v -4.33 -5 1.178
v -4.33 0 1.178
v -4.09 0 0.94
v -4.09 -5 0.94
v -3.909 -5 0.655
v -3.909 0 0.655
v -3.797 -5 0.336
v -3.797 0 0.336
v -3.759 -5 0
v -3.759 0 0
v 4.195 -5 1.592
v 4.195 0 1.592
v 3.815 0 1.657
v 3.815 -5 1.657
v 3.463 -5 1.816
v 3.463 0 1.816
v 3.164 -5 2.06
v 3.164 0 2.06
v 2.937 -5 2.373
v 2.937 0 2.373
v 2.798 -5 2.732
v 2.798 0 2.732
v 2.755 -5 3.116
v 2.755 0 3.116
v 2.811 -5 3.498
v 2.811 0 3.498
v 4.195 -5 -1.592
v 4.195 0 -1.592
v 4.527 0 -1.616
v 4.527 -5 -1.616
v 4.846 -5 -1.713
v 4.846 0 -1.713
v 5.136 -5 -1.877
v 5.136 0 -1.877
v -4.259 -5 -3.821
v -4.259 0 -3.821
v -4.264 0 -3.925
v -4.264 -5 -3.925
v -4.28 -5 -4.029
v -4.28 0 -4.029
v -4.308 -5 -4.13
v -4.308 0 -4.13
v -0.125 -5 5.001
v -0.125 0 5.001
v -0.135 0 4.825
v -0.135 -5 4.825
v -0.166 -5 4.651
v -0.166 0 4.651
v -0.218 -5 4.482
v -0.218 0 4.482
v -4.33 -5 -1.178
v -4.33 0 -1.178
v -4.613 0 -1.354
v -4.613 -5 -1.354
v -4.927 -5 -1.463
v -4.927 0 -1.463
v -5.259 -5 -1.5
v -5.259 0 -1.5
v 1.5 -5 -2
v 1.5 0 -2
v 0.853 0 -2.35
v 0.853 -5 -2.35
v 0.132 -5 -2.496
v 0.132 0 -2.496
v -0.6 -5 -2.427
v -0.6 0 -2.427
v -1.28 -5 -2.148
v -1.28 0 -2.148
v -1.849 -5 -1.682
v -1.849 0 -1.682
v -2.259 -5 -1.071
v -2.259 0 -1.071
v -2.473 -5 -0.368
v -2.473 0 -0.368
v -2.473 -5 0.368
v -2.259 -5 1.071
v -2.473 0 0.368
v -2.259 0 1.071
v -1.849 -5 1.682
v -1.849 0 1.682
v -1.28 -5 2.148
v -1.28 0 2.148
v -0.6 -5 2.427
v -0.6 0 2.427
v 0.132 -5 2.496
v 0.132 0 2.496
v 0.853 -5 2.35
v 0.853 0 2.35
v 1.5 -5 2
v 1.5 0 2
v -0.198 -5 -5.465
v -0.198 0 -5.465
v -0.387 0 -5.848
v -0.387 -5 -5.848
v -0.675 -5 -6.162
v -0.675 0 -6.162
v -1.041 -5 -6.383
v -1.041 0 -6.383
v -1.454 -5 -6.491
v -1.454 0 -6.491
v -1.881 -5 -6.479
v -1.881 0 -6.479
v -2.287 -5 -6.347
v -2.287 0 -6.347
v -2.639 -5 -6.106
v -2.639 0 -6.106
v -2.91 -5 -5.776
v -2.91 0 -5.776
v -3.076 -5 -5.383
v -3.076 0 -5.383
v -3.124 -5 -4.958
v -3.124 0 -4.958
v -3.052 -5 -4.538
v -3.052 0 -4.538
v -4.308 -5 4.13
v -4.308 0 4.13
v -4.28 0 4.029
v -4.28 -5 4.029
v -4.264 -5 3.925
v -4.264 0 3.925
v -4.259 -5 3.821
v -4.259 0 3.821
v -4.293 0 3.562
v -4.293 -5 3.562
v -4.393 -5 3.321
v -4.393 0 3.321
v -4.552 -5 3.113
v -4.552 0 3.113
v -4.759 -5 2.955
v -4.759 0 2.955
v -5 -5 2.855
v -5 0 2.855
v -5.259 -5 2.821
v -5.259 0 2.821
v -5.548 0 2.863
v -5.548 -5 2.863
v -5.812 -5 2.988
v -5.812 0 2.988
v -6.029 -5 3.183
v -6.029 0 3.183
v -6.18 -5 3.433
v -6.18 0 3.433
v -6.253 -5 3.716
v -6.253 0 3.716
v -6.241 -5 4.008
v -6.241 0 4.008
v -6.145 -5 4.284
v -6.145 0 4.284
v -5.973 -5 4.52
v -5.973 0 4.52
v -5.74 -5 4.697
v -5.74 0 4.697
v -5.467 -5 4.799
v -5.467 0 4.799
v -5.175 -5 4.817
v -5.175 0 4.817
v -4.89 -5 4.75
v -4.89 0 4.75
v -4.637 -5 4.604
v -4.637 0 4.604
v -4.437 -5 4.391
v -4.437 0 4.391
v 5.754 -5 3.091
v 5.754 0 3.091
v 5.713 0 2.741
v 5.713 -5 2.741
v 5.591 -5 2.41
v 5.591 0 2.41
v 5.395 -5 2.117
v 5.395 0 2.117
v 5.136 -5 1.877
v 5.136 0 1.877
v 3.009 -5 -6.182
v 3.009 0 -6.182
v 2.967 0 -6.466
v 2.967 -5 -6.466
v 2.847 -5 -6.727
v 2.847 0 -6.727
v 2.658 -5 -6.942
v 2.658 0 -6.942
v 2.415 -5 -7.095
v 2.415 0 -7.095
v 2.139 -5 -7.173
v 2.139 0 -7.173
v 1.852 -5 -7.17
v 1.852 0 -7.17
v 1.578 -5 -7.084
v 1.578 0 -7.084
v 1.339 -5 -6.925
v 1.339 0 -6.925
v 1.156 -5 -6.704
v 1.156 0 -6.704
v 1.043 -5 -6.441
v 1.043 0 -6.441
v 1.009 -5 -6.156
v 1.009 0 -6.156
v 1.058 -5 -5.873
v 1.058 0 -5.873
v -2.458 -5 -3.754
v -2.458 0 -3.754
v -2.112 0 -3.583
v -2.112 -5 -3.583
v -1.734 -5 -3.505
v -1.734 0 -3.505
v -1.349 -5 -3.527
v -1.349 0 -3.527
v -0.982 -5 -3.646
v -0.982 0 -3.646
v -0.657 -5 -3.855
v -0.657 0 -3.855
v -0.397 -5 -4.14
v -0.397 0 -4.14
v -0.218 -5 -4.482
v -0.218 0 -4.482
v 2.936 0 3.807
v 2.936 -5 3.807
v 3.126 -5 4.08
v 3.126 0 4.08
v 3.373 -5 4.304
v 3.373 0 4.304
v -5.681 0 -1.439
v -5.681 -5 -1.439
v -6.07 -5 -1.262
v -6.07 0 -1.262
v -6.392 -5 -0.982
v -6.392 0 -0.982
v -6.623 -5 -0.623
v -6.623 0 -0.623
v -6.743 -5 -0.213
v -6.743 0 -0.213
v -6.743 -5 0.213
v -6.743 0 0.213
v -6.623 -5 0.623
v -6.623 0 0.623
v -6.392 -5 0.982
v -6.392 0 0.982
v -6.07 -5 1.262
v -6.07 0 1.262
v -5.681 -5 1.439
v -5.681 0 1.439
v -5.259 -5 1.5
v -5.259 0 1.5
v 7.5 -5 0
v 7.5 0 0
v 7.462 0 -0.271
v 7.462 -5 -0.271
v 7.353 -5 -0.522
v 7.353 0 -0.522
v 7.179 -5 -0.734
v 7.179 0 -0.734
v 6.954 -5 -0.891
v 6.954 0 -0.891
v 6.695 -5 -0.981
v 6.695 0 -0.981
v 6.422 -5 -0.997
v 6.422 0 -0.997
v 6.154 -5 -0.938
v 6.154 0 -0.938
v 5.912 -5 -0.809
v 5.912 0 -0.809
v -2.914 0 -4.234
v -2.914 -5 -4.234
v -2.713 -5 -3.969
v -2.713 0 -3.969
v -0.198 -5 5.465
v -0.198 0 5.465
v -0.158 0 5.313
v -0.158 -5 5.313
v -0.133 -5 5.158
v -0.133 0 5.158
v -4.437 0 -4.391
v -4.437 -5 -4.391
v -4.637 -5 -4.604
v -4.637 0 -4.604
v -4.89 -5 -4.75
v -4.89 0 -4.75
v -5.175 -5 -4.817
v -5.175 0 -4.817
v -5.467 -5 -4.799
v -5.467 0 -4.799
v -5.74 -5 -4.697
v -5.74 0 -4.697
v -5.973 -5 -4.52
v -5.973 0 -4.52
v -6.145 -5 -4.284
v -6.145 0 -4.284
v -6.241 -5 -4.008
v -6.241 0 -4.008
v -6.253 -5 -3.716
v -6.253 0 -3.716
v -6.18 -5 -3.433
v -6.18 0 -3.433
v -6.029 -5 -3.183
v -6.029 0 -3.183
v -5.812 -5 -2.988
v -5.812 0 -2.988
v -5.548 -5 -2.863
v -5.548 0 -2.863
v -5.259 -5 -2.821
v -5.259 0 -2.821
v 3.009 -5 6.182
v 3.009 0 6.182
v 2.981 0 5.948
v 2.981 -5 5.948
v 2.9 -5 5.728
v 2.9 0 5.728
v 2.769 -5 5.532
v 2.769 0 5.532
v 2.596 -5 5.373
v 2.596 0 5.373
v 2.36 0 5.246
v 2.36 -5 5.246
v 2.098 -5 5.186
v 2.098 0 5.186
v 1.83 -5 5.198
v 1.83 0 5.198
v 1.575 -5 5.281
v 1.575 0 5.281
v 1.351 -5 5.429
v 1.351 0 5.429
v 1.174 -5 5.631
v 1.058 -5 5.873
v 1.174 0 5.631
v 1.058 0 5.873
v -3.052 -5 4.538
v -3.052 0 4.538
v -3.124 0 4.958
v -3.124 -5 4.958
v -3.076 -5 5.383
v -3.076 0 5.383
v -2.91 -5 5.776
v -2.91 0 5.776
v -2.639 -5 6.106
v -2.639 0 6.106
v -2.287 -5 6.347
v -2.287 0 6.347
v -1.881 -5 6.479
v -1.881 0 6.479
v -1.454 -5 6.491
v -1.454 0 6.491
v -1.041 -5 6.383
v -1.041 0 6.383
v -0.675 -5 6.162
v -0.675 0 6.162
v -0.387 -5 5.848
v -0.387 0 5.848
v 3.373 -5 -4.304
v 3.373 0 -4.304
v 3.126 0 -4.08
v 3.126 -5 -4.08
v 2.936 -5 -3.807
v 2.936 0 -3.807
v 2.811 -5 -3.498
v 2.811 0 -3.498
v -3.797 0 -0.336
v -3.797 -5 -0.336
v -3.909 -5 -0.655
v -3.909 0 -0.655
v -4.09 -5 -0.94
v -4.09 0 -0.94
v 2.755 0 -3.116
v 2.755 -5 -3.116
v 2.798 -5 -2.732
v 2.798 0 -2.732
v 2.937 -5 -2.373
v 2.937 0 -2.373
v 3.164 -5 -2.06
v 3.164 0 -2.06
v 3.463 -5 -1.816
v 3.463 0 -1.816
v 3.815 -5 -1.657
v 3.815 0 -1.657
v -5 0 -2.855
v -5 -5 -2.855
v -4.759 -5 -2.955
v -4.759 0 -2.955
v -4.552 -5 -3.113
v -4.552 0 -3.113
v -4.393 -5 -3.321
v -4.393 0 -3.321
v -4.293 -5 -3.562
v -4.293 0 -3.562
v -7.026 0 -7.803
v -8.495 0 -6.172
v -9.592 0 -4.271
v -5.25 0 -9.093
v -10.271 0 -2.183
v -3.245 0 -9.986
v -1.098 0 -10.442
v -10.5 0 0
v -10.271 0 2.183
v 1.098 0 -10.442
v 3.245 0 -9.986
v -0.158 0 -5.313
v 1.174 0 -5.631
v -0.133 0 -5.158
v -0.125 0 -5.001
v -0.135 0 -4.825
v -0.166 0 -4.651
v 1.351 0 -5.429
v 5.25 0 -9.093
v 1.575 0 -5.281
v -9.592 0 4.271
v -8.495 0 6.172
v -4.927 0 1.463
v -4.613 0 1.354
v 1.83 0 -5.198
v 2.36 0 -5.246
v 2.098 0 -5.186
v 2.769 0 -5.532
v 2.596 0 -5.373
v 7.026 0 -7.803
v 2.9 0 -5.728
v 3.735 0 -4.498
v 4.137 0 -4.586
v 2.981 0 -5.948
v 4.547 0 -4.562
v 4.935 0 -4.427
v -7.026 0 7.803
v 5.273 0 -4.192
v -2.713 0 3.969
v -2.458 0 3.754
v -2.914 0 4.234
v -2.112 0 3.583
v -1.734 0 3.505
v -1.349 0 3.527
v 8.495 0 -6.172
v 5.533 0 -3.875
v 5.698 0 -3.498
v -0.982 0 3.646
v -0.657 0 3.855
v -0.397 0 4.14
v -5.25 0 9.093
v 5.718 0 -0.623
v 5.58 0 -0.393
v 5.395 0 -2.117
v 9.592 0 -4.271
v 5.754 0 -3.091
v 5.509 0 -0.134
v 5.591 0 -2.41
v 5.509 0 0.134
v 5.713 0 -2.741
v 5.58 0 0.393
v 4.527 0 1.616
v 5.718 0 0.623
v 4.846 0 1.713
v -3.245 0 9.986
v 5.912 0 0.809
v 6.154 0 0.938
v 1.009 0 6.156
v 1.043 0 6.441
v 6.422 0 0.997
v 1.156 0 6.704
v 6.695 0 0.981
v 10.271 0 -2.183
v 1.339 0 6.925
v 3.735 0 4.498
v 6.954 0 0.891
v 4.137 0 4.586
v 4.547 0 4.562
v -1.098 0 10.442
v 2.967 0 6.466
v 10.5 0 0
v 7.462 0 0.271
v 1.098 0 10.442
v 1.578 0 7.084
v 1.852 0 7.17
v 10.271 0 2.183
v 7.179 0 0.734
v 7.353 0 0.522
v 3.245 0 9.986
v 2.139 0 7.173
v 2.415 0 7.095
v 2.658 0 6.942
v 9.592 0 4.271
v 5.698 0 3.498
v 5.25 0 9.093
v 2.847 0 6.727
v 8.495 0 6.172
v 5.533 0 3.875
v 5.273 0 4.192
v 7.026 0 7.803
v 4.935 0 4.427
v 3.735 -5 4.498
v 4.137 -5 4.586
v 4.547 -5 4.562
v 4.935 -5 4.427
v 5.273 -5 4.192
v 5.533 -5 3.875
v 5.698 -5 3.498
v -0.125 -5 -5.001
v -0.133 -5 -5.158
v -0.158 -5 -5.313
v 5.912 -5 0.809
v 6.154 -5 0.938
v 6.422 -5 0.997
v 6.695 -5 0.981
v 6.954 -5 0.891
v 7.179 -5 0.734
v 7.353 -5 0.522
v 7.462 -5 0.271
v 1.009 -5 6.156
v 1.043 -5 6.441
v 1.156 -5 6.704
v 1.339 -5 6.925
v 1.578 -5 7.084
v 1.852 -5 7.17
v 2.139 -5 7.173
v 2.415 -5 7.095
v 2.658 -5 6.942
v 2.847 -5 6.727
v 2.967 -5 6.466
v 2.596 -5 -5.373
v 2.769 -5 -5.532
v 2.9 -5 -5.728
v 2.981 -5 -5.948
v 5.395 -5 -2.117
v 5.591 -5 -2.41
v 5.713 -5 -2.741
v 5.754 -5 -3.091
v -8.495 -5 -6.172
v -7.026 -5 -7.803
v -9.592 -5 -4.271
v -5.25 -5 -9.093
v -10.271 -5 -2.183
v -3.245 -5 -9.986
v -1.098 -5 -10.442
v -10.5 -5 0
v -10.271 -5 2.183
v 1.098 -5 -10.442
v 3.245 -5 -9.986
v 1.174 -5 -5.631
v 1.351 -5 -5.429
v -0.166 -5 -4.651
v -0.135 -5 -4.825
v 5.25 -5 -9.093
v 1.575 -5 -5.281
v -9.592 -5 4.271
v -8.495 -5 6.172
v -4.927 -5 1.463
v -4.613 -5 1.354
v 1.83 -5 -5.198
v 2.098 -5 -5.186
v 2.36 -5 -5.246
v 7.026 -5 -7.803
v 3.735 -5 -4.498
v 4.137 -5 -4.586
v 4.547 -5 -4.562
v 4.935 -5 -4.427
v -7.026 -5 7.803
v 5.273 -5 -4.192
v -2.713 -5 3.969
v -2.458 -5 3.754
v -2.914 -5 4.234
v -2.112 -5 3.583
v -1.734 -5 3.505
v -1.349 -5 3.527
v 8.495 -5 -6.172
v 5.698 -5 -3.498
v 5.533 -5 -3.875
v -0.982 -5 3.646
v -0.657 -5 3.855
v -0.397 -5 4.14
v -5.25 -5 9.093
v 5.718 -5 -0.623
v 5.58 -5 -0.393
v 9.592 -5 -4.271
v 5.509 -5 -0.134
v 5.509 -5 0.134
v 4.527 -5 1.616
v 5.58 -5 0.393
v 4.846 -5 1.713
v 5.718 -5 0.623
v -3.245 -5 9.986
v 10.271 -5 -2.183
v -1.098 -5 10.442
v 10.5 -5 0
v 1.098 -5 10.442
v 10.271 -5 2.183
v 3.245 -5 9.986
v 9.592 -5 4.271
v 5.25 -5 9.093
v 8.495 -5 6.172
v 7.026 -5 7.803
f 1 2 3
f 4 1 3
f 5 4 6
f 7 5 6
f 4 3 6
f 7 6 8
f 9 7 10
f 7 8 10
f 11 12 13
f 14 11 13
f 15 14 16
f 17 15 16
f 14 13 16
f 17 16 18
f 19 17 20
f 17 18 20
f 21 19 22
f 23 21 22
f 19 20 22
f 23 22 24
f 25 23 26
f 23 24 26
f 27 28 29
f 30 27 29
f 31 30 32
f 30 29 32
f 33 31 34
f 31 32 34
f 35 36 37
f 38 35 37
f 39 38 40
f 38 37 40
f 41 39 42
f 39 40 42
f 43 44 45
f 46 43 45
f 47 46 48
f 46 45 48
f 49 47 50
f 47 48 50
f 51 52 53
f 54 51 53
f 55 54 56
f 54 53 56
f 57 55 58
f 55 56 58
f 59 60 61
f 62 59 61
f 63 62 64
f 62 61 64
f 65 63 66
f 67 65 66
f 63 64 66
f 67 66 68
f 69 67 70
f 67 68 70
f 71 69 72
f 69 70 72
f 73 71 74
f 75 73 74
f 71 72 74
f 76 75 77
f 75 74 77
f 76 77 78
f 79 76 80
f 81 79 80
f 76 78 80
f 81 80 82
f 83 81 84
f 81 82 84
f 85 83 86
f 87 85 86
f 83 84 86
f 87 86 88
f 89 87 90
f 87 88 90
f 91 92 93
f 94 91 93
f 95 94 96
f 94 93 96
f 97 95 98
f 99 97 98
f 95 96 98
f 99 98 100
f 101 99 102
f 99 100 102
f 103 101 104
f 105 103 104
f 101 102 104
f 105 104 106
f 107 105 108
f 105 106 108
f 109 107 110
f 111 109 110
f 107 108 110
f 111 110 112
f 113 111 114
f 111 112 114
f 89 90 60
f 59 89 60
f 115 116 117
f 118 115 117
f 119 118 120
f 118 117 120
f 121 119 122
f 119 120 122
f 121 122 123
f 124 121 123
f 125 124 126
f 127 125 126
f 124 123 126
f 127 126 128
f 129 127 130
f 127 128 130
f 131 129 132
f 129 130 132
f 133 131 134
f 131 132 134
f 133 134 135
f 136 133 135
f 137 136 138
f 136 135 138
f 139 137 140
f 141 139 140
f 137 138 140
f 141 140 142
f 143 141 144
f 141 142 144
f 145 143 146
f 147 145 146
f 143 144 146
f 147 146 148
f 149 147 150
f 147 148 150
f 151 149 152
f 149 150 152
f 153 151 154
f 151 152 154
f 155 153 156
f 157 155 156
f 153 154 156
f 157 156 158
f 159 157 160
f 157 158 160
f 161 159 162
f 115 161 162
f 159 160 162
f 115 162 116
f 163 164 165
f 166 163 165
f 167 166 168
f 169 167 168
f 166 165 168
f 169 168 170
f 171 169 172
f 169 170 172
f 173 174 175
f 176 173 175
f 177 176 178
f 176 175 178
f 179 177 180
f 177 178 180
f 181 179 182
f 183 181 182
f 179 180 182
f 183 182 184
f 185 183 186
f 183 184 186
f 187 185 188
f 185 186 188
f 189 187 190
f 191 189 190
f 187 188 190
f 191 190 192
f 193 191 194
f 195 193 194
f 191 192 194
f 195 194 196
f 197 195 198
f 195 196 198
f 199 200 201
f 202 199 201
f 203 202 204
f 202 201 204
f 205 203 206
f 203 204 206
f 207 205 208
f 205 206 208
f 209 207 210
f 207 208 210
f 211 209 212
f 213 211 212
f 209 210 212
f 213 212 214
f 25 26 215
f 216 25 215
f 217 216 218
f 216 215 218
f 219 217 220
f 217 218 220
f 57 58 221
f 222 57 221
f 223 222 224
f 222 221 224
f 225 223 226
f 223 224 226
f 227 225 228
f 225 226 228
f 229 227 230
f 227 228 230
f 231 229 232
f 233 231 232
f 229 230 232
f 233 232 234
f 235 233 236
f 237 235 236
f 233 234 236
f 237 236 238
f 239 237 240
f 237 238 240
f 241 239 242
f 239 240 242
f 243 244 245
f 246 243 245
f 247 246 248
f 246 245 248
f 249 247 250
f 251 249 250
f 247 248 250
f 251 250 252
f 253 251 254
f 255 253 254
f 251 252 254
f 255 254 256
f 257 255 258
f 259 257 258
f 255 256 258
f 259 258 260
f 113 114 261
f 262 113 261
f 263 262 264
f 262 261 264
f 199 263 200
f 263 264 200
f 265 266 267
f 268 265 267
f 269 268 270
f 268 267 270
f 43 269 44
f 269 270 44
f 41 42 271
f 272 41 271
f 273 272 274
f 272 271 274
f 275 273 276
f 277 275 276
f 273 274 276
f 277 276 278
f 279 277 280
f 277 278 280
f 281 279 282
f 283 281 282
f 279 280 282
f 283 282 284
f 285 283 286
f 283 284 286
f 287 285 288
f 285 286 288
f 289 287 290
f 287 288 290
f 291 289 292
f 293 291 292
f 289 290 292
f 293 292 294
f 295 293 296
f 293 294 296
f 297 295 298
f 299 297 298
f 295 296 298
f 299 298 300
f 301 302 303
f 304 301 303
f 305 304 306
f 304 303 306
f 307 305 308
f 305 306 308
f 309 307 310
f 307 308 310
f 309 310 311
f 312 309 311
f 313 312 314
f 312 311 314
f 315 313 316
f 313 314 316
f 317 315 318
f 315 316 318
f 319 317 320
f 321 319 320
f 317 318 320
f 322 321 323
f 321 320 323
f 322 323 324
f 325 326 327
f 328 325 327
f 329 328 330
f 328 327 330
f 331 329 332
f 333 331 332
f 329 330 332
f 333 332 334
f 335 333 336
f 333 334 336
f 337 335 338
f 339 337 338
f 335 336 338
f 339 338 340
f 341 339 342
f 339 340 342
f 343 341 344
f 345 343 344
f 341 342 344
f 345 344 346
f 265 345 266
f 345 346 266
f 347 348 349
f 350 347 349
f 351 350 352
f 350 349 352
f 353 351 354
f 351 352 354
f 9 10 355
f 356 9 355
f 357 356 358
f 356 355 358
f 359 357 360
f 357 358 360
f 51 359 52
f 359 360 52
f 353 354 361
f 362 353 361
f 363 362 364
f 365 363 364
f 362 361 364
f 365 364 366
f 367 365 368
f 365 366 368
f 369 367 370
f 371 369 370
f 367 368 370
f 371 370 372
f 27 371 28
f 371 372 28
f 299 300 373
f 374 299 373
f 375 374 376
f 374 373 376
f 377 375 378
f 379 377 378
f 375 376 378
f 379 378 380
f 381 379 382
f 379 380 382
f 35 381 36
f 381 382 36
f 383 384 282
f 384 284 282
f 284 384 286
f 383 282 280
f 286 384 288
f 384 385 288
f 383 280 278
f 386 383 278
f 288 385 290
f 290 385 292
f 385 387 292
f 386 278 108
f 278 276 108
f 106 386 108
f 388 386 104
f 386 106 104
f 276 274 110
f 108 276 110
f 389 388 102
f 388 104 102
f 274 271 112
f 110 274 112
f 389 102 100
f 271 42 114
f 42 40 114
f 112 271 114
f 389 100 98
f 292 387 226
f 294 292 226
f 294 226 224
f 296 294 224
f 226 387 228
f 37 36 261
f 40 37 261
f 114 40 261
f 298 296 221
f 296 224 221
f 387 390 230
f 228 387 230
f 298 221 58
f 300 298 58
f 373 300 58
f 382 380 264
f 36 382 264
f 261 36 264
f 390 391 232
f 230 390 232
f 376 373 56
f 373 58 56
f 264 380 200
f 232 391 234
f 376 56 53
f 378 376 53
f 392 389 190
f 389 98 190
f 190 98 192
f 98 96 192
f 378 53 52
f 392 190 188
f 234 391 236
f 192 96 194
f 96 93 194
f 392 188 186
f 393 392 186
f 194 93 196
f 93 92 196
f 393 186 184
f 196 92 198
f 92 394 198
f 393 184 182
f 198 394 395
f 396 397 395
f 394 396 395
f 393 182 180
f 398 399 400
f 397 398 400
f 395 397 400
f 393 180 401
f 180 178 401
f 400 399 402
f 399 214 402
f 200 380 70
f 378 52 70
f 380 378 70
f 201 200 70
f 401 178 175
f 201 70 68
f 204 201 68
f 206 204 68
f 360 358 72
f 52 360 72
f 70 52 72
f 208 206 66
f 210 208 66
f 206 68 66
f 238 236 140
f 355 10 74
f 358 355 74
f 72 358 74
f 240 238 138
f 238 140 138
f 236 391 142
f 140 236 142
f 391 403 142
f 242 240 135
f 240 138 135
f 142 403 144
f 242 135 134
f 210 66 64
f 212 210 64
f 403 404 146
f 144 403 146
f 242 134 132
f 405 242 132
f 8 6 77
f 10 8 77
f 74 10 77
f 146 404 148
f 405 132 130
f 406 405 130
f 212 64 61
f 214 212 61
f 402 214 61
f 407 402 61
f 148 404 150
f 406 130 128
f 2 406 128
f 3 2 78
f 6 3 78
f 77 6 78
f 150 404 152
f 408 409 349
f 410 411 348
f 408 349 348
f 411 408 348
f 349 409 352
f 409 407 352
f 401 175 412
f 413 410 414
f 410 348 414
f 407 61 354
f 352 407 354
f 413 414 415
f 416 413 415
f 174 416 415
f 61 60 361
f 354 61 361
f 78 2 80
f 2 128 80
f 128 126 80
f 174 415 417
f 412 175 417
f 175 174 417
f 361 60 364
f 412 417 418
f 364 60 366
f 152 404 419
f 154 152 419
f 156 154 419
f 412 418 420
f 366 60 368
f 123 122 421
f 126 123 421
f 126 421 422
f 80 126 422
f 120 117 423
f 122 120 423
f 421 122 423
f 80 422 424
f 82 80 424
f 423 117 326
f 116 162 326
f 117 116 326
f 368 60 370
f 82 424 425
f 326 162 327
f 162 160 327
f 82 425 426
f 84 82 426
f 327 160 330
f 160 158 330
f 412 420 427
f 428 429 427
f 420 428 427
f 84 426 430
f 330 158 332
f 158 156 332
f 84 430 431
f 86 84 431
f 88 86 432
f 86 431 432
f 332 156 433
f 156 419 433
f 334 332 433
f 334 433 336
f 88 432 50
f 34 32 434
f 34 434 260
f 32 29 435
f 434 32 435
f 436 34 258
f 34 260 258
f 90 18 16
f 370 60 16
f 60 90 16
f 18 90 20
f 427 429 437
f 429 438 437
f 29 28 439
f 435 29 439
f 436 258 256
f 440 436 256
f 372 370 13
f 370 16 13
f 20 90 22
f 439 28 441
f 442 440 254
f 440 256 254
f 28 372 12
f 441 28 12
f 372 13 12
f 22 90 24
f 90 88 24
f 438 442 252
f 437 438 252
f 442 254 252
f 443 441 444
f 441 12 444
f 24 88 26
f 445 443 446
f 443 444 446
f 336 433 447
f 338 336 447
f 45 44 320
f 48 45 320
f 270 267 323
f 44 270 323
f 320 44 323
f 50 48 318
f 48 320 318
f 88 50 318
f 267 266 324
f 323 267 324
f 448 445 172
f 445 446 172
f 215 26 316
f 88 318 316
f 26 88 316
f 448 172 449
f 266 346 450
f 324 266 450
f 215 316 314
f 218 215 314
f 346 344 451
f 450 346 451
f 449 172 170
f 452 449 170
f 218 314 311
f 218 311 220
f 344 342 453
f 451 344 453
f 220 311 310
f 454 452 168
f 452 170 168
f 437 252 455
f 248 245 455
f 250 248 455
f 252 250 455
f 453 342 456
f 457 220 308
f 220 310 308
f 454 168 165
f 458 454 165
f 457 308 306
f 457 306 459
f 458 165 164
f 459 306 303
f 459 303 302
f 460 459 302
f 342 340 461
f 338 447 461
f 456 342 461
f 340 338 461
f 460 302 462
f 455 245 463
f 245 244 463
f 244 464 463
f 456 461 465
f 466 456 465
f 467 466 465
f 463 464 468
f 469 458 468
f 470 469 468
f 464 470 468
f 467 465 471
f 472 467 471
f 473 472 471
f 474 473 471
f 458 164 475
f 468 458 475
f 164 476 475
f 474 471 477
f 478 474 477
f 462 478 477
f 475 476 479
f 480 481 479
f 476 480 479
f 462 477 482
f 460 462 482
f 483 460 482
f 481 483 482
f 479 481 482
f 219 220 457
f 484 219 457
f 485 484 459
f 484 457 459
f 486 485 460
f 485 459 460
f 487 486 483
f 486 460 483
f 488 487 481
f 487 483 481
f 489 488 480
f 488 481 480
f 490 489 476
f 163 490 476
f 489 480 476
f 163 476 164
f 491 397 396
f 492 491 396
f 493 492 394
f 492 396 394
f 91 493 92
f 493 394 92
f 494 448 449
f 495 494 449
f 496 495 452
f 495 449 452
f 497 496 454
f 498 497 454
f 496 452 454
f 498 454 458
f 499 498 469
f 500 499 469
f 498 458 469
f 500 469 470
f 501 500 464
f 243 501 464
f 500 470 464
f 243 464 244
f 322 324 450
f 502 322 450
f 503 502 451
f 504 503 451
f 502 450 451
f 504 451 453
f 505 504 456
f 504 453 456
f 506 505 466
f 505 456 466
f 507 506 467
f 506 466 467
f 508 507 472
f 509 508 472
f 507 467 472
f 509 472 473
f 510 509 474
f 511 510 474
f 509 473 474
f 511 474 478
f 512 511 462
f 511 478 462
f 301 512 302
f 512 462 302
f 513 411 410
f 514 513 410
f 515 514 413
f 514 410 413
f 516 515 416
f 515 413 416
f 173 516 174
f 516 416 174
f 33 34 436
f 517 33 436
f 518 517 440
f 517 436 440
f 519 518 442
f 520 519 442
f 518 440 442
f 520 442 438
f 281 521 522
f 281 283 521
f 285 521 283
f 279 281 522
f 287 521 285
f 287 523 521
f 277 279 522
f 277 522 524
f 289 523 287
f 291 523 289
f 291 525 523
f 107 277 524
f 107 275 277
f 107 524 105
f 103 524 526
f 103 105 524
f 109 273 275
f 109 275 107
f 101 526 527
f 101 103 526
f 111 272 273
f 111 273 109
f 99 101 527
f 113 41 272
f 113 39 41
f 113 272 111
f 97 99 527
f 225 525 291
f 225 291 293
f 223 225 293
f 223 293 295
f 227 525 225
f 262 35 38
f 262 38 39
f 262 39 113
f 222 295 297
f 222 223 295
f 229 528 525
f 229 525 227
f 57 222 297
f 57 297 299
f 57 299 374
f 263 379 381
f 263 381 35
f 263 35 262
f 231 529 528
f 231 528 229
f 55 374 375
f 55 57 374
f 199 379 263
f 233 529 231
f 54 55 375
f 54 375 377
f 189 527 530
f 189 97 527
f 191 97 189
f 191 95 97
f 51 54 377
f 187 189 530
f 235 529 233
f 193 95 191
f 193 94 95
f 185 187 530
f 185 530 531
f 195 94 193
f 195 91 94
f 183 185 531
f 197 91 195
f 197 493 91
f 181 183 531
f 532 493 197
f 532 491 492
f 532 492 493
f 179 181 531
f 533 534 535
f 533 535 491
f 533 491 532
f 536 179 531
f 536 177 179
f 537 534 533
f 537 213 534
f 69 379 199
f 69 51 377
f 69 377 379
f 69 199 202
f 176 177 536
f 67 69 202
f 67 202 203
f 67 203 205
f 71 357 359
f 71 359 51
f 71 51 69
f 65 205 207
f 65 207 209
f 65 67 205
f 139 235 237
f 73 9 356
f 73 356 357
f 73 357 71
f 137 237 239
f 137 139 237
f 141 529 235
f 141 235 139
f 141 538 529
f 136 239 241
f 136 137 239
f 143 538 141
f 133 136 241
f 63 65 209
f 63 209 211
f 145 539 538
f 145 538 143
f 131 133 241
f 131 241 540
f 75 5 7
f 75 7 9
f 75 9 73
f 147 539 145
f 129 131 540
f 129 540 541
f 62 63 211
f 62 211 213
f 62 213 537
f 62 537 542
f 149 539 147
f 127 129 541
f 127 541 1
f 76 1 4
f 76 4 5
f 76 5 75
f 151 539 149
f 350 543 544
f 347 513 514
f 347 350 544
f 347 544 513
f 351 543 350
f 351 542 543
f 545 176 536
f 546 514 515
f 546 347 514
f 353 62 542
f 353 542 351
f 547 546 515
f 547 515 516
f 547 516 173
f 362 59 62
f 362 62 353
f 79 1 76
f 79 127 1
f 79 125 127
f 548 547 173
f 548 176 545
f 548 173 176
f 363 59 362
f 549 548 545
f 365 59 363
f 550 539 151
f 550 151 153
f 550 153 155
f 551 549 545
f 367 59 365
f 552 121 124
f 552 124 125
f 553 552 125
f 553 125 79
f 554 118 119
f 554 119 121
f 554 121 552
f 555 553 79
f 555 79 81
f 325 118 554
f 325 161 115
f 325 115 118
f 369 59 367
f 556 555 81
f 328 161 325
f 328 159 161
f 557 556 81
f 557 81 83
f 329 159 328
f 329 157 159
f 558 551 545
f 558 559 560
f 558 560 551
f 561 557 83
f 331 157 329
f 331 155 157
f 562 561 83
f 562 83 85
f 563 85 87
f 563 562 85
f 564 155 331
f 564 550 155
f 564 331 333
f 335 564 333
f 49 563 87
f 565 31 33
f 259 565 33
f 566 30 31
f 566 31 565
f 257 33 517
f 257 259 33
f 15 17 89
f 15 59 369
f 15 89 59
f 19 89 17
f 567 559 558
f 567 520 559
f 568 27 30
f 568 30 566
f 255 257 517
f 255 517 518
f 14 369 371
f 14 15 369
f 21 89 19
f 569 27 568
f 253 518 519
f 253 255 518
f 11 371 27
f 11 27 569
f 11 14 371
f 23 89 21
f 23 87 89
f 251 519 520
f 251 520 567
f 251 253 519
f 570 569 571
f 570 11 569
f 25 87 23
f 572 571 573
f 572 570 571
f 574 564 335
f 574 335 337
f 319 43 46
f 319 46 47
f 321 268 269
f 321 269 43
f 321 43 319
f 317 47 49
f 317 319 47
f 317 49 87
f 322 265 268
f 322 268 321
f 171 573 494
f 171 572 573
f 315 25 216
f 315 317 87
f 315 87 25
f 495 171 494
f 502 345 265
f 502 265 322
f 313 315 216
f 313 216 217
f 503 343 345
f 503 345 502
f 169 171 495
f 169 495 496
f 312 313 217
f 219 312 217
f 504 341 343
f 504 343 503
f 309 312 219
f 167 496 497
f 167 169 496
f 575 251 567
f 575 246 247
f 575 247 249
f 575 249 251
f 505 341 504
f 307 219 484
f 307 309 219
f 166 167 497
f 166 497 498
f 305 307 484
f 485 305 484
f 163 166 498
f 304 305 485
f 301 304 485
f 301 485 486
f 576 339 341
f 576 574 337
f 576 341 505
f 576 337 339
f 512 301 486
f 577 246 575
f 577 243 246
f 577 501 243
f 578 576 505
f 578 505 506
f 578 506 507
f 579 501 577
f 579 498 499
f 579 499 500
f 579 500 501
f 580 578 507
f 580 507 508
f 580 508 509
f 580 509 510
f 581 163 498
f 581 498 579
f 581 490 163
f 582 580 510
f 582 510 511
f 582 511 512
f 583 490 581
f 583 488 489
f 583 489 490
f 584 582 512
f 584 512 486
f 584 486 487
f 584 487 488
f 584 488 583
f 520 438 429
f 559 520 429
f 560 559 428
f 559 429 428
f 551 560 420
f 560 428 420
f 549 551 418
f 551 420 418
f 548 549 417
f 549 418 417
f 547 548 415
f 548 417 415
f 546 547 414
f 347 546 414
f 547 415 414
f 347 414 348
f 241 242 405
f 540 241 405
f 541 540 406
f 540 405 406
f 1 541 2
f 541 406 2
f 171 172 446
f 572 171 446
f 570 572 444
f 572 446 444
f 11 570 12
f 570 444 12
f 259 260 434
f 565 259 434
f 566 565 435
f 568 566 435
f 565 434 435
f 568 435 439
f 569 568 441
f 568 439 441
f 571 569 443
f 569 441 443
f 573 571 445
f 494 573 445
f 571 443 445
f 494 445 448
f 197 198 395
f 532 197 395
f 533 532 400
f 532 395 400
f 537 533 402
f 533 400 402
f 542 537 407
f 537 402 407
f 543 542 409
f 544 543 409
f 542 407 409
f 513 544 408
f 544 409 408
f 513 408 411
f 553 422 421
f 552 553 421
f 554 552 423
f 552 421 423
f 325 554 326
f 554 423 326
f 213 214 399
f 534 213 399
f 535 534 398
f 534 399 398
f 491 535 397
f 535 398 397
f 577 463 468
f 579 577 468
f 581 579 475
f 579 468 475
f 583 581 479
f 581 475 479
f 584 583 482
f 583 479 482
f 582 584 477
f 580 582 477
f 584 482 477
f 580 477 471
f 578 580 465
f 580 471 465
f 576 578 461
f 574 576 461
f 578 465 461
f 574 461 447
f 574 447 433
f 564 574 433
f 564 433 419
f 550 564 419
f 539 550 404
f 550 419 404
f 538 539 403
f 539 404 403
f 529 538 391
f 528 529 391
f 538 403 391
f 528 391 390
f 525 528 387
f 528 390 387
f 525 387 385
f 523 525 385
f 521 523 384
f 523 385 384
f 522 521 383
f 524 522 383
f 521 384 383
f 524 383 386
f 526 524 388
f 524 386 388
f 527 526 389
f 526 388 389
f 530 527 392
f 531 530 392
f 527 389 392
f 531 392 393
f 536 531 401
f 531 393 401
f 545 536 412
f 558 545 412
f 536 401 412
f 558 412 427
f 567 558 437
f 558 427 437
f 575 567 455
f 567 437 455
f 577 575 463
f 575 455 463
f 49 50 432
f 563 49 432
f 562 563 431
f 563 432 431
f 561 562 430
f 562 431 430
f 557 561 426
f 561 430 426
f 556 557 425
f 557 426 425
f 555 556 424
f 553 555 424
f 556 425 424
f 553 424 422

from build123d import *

# Parameters (mm, degrees)
F0_R     = 10.5
F1_DEPTH = 5


# Not quite as in the source:
# - a feature names something its author has since deleted; it is built from what else it names


with BuildPart() as f1:
    # F0 (on Front) → F1 (new body)
    with BuildSketch(Plane.XZ):
        Circle(F0_R)
        with BuildLine():
            Line((-6.1874431518, -2.6427799437), (-5.2586104634, -1.91030207))
            Line((-5.2586104634, -1.91030207), (-5.2586104634, -1.5))
            ThreePointArc((-5.2586104634, -1.5), (-6.7586104634, 0), (-5.2586104634, 1.5))
            Line((-5.2586104634, 1.5), (-5.2586104634, 1.91030207))
            Line((-5.2586104634, 1.91030207), (-6.1874431518, 2.6427799437))
            ThreePointArc((-6.1874431518, 2.6427799437), (-6.472135955, 4.7022820183), (-4.4254581722, 5.0679442137))
            Line((-4.4254581722, 5.0679442137), (-3.4418052317, 4.4109199439))
            Line((-3.4418052317, 4.4109199439), (-3.0515847744, 4.5377102563))
            ThreePointArc((-3.0515847744, 4.5377102563), (-2.0885254916, 6.4278205224), (-0.1984152256, 5.4647612395))
            Line((-0.1984152256, 5.4647612395), (0.1918052317, 5.5915515519))
            Line((0.1918052317, 5.5915515519), (0.601408001, 6.7012720437))
            ThreePointArc((0.601408001, 6.7012720437), (2.2724250824, 7.6584857382), (3.5086104634, 6.1818673559))
            ThreePointArc((3.5086104634, 6.1818673559), (3.4944811986, 5.976469794), (3.4523595855, 5.7749417209))
            Line((3.4523595855, 5.7749417209), (3.1314578476, 4.6364005169))
            Line((3.1314578476, 4.6364005169), (3.3726273533, 4.3044591695))
            ThreePointArc((3.3726273533, 4.3044591695), (4.9352909813, 4.4274434642), (5.7543052317, 3.090933678))
            ThreePointArc((5.7543052317, 3.090933678), (5.590815018, 2.4099479283), (5.1359831102, 1.8774081864))
            Line((5.1359831102, 1.8774081864), (5.3771526159, 1.545466839))
            Line((5.3771526159, 1.545466839), (6.5591337375, 1.4988339471))
            ThreePointArc((6.5591337375, 1.4988339471), (7.5813650184, 1.0395430231), (8, 0))
            ThreePointArc((8, 0), (7.5813650184, -1.0395430231), (6.5591337375, -1.4988339471))
            Line((6.5591337375, -1.4988339471), (5.3771526159, -1.545466839))
            Line((5.3771526159, -1.545466839), (5.1359831102, -1.8774081864))
            ThreePointArc((5.1359831102, -1.8774081864), (5.590815018, -2.4099479283), (5.7543052317, -3.090933678))
            ThreePointArc((5.7543052317, -3.090933678), (4.9352909813, -4.4274434642), (3.3726273533, -4.3044591695))
            Line((3.3726273533, -4.3044591695), (3.1314578476, -4.6364005169))
            Line((3.1314578476, -4.6364005169), (3.4523595855, -5.7749417209))
            ThreePointArc((3.4523595855, -5.7749417209), (3.4944811986, -5.976469794), (3.5086104634, -6.1818673559))
            ThreePointArc((3.5086104634, -6.1818673559), (2.2724250824, -7.6584857382), (0.601408001, -6.7012720437))
            Line((0.601408001, -6.7012720437), (0.1918052317, -5.5915515519))
            Line((0.1918052317, -5.5915515519), (-0.1984152256, -5.4647612395))
            ThreePointArc((-0.1984152256, -5.4647612395), (-2.0885254916, -6.4278205224), (-3.0515847744, -4.5377102563))
            Line((-3.0515847744, -4.5377102563), (-3.4418052317, -4.4109199439))
            Line((-3.4418052317, -4.4109199439), (-4.4254581722, -5.0679442137))
            ThreePointArc((-4.4254581722, -5.0679442137), (-6.472135955, -4.7022820183), (-6.1874431518, -2.6427799437))
        make_face(mode=Mode.SUBTRACT)
        with BuildLine():
            Line((-5.2586104634, -1.91030207), (-5.2586104634, -2.3206041399))
            ThreePointArc((-5.2586104634, -2.3206041399), (-4.1979502917, -2.7599439681), (-3.7586104634, -3.8206041399))
            ThreePointArc((-3.7586104634, -3.8206041399), (-3.7770779525, -4.0552558375), (-3.832025689, -4.2841296315))
            Line((-3.832025689, -4.2841296315), (-3.4418052317, -4.4109199439))
            Line((-3.4418052317, -4.4109199439), (-2.4581522912, -3.7538956741))
            ThreePointArc((-2.4581522912, -3.7538956741), (-1.1614745084, -3.5746509735), (-0.2177975376, -4.4818310601))
            Line((-0.2177975376, -4.4818310601), (0.1918052317, -5.5915515519))
            Line((0.1918052317, -5.5915515519), (0.582025689, -5.7183418644))
            ThreePointArc((0.582025689, -5.7183418644), (1.5450849719, -4.7552825815), (2.8902883419, -4.9683418644))
            Line((2.8902883419, -4.9683418644), (3.1314578476, -4.6364005169))
            Line((3.1314578476, -4.6364005169), (2.8105561096, -3.497859313))
            ThreePointArc((2.8105561096, -3.497859313), (3.0407797402, -2.2092557995), (4.1951714942, -1.5920997308))
            Line((4.1951714942, -1.5920997308), (5.3771526159, -1.545466839))
            Line((5.3771526159, -1.545466839), (5.6183221216, -1.2135254916))
            ThreePointArc((5.6183221216, -1.2135254916), (5, 0), (5.6183221216, 1.2135254916))
            Line((5.6183221216, 1.2135254916), (5.3771526159, 1.545466839))
            Line((5.3771526159, 1.545466839), (4.1951714942, 1.5920997308))
            ThreePointArc((4.1951714942, 1.5920997308), (3.0407797402, 2.2092557995), (2.8105561096, 3.497859313))
            Line((2.8105561096, 3.497859313), (3.1314578476, 4.6364005169))
            Line((3.1314578476, 4.6364005169), (2.8902883419, 4.9683418644))
            ThreePointArc((2.8902883419, 4.9683418644), (1.5450849719, 4.7552825815), (0.582025689, 5.7183418644))
            Line((0.582025689, 5.7183418644), (0.1918052317, 5.5915515519))
            Line((0.1918052317, 5.5915515519), (-0.2177975376, 4.4818310601))
            ThreePointArc((-0.2177975376, 4.4818310601), (-1.1614745084, 3.5746509735), (-2.4581522912, 3.7538956741))
            Line((-2.4581522912, 3.7538956741), (-3.4418052317, 4.4109199439))
            Line((-3.4418052317, 4.4109199439), (-3.832025689, 4.2841296315))
            ThreePointArc((-3.832025689, 4.2841296315), (-3.7770779525, 4.0552558375), (-3.7586104634, 3.8206041399))
            ThreePointArc((-3.7586104634, 3.8206041399), (-4.1979502917, 2.7599439681), (-5.2586104634, 2.3206041399))
            Line((-5.2586104634, 2.3206041399), (-5.2586104634, 1.91030207))
            Line((-5.2586104634, 1.91030207), (-4.3297777751, 1.1778241962))
            ThreePointArc((-4.3297777751, 1.1778241962), (-3.9089347556, 0.6545039983), (-3.7586104634, 0))
            ThreePointArc((-3.7586104634, 0), (-3.9089347556, -0.6545039983), (-4.3297777751, -1.1778241962))
            Line((-4.3297777751, -1.1778241962), (-5.2586104634, -1.91030207))
        make_face()
        with BuildLine():
            ThreePointArc((1.5, 2), (2.2360679775, 1.1180339887), (2.5, 0))
            ThreePointArc((2.5, 0), (2.2360679775, -1.1180339887), (1.5, -2))
            ThreePointArc((1.5, -2), (-2.5, 0), (1.5, 2))
        make_face(mode=Mode.SUBTRACT)
        with BuildLine():
            ThreePointArc((1.5, -2), (2.2360679775, -1.1180339887), (2.5, 0))
            ThreePointArc((2.5, 0), (2.2360679775, 1.1180339887), (1.5, 2))
            Line((1.5, 2), (1.5, -2))
        make_face()
        with BuildLine():
            ThreePointArc((-4.3075539471, -4.1296211343), (-6.0676274578, -4.4083893922), (-5.2586104634, -2.8206041399))
            Line((-5.2586104634, -2.8206041399), (-5.2586104634, -2.3206041399))
            ThreePointArc((-5.2586104634, -2.3206041399), (-5.7501710933, -2.403435079), (-6.1874431518, -2.6427799437))
            ThreePointArc((-6.1874431518, -2.6427799437), (-6.472135955, -4.7022820183), (-4.4254581722, -5.0679442137))
            ThreePointArc((-4.4254581722, -5.0679442137), (-4.0627031818, -4.7260354038), (-3.832025689, -4.2841296315))
            Line((-3.832025689, -4.2841296315), (-4.3075539471, -4.1296211343))
        make_face()
        with BuildLine():
            ThreePointArc((-6.1874431518, 2.6427799437), (-5.7501710933, 2.403435079), (-5.2586104634, 2.3206041399))
            Line((-5.2586104634, 2.3206041399), (-5.2586104634, 2.8206041399))
            ThreePointArc((-5.2586104634, 2.8206041399), (-6.0676274578, 4.4083893922), (-4.3075539471, 4.1296211343))
            Line((-4.3075539471, 4.1296211343), (-3.832025689, 4.2841296315))
            ThreePointArc((-3.832025689, 4.2841296315), (-4.0627031818, 4.7260354038), (-4.4254581722, 5.0679442137))
            ThreePointArc((-4.4254581722, 5.0679442137), (-6.472135955, 4.7022820183), (-6.1874431518, 2.6427799437))
        make_face()
        with BuildLine():
            Line((1.0575539471, -5.8728503615), (0.582025689, -5.7183418644))
            ThreePointArc((0.582025689, -5.7183418644), (0.508902005, -6.2114399724), (0.601408001, -6.7012720437))
            ThreePointArc((0.601408001, -6.7012720437), (2.2724250824, -7.6584857382), (3.5086104634, -6.1818673559))
            ThreePointArc((3.5086104634, -6.1818673559), (3.4944811986, -5.976469794), (3.4523595855, -5.7749417209))
            ThreePointArc((3.4523595855, -5.7749417209), (3.2392824408, -5.3242855906), (2.8902883419, -4.9683418644))
            Line((2.8902883419, -4.9683418644), (2.5963957157, -5.3728503615))
            ThreePointArc((2.5963957157, -5.3728503615), (2.8996169876, -5.7278768562), (3.0086104634, -6.1818673559))
            ThreePointArc((3.0086104634, -6.1818673559), (1.8521759984, -7.1695556965), (1.0575539471, -5.8728503615))
        make_face()
        with BuildLine():
            ThreePointArc((0.601408001, 6.7012720437), (0.508902005, 6.2114399724), (0.582025689, 5.7183418644))
            Line((0.582025689, 5.7183418644), (1.0575539471, 5.8728503615))
            ThreePointArc((1.0575539471, 5.8728503615), (1.8521759984, 7.1695556965), (3.0086104634, 6.1818673559))
            ThreePointArc((3.0086104634, 6.1818673559), (2.8996169876, 5.7278768562), (2.5963957157, 5.3728503615))
            Line((2.5963957157, 5.3728503615), (2.8902883419, 4.9683418644))
            ThreePointArc((2.8902883419, 4.9683418644), (3.2392824408, 5.3242855906), (3.4523595855, 5.7749417209))
            ThreePointArc((3.4523595855, 5.7749417209), (3.4944811986, 5.976469794), (3.5086104634, 6.1818673559))
            ThreePointArc((3.5086104634, 6.1818673559), (2.2724250824, 7.6584857382), (0.601408001, 6.7012720437))
        make_face()
        with BuildLine():
            Line((5.9122147477, -0.8090169944), (5.6183221216, -1.2135254916))
            ThreePointArc((5.6183221216, -1.2135254916), (6.0646898294, -1.435445943), (6.5591337375, -1.4988339471))
            ThreePointArc((6.5591337375, -1.4988339471), (7.5813650184, -1.0395430231), (8, 0))
            ThreePointArc((8, 0), (7.5813650184, 1.0395430231), (6.5591337375, 1.4988339471))
            ThreePointArc((6.5591337375, 1.4988339471), (6.0646898294, 1.435445943), (5.6183221216, 1.2135254916))
            Line((5.6183221216, 1.2135254916), (5.9122147477, 0.8090169944))
            ThreePointArc((5.9122147477, 0.8090169944), (6.9539904997, 0.8910065242), (7.5, 0))
            ThreePointArc((7.5, 0), (6.9539904997, -0.8910065242), (5.9122147477, -0.8090169944))
        make_face()
        with BuildLine():
            Line((-5.2586104634, -2.3206041399), (-5.2586104634, -2.8206041399))
            ThreePointArc((-5.2586104634, -2.8206041399), (-4.5515036823, -3.1134973587), (-4.2586104634, -3.8206041399))
            ThreePointArc((-4.2586104634, -3.8206041399), (-4.2709221228, -3.9770386049), (-4.3075539471, -4.1296211343))
            Line((-4.3075539471, -4.1296211343), (-3.832025689, -4.2841296315))
            ThreePointArc((-3.832025689, -4.2841296315), (-3.7770779525, -4.0552558375), (-3.7586104634, -3.8206041399))
            ThreePointArc((-3.7586104634, -3.8206041399), (-4.1979502917, -2.7599439681), (-5.2586104634, -2.3206041399))
        make_face()
        with BuildLine():
            Line((-5.2586104634, 2.8206041399), (-5.2586104634, 2.3206041399))
            ThreePointArc((-5.2586104634, 2.3206041399), (-4.1979502917, 2.7599439681), (-3.7586104634, 3.8206041399))
            ThreePointArc((-3.7586104634, 3.8206041399), (-3.7770779525, 4.0552558375), (-3.832025689, 4.2841296315))
            Line((-3.832025689, 4.2841296315), (-4.3075539471, 4.1296211343))
            ThreePointArc((-4.3075539471, 4.1296211343), (-4.2709221228, 3.9770386049), (-4.2586104634, 3.8206041399))
            ThreePointArc((-4.2586104634, 3.8206041399), (-4.5515036823, 3.1134973587), (-5.2586104634, 2.8206041399))
        make_face()
        with BuildLine():
            ThreePointArc((2.8902883419, -4.9683418644), (1.5450849719, -4.7552825815), (0.582025689, -5.7183418644))
            Line((0.582025689, -5.7183418644), (1.0575539471, -5.8728503615))
            ThreePointArc((1.0575539471, -5.8728503615), (1.6995934691, -5.2308108396), (2.5963957157, -5.3728503615))
            Line((2.5963957157, -5.3728503615), (2.8902883419, -4.9683418644))
        make_face()
        with BuildLine():
            Line((1.0575539471, 5.8728503615), (0.582025689, 5.7183418644))
            ThreePointArc((0.582025689, 5.7183418644), (1.5450849719, 4.7552825815), (2.8902883419, 4.9683418644))
            Line((2.8902883419, 4.9683418644), (2.5963957157, 5.3728503615))
            ThreePointArc((2.5963957157, 5.3728503615), (1.6995934691, 5.2308108396), (1.0575539471, 5.8728503615))
        make_face()
        with BuildLine():
            ThreePointArc((5.6183221216, 1.2135254916), (5, 0), (5.6183221216, -1.2135254916))
            Line((5.6183221216, -1.2135254916), (5.9122147477, -0.8090169944))
            ThreePointArc((5.9122147477, -0.8090169944), (5.5, 0), (5.9122147477, 0.8090169944))
            Line((5.9122147477, 0.8090169944), (5.6183221216, 1.2135254916))
        make_face()
        with BuildLine():
            ThreePointArc((-6.1874431518, -2.6427799437), (-5.7501710933, -2.403435079), (-5.2586104634, -2.3206041399))
            Line((-5.2586104634, -2.3206041399), (-5.2586104634, -1.91030207))
            Line((-5.2586104634, -1.91030207), (-6.1874431518, -2.6427799437))
        make_face()
        with BuildLine():
            Line((-3.4418052317, -4.4109199439), (-3.832025689, -4.2841296315))
            ThreePointArc((-3.832025689, -4.2841296315), (-4.0627031818, -4.7260354038), (-4.4254581722, -5.0679442137))
            Line((-4.4254581722, -5.0679442137), (-3.4418052317, -4.4109199439))
        make_face()
        with BuildLine():
            Line((-5.2586104634, -1.5), (-5.2586104634, -1.91030207))
            Line((-5.2586104634, -1.91030207), (-4.3297777751, -1.1778241962))
            ThreePointArc((-4.3297777751, -1.1778241962), (-4.7670498335, -1.4171690609), (-5.2586104634, -1.5))
        make_face()
        with BuildLine():
            Line((-2.4581522912, -3.7538956741), (-3.4418052317, -4.4109199439))
            Line((-3.4418052317, -4.4109199439), (-3.0515847744, -4.5377102563))
            ThreePointArc((-3.0515847744, -4.5377102563), (-2.8209072816, -4.095804484), (-2.4581522912, -3.7538956741))
        make_face()
        with BuildLine():
            Line((-5.2586104634, 1.91030207), (-5.2586104634, 1.5))
            ThreePointArc((-5.2586104634, 1.5), (-4.7670498335, 1.4171690609), (-4.3297777751, 1.1778241962))
            Line((-4.3297777751, 1.1778241962), (-5.2586104634, 1.91030207))
        make_face()
        with BuildLine():
            ThreePointArc((-0.125, -5.0012357479), (-0.1434674891, -5.2358874455), (-0.1984152256, -5.4647612395))
            Line((-0.1984152256, -5.4647612395), (0.1918052317, -5.5915515519))
            Line((0.1918052317, -5.5915515519), (-0.2177975376, -4.4818310601))
            ThreePointArc((-0.2177975376, -4.4818310601), (-0.1483816177, -4.737421129), (-0.125, -5.0012357479))
        make_face()
        with BuildLine():
            Line((-6.1874431518, 2.6427799437), (-5.2586104634, 1.91030207))
            Line((-5.2586104634, 1.91030207), (-5.2586104634, 2.3206041399))
            ThreePointArc((-5.2586104634, 2.3206041399), (-5.7501710933, 2.403435079), (-6.1874431518, 2.6427799437))
        make_face()
        with BuildLine():
            Line((0.582025689, -5.7183418644), (0.1918052317, -5.5915515519))
            Line((0.1918052317, -5.5915515519), (0.601408001, -6.7012720437))
            ThreePointArc((0.601408001, -6.7012720437), (0.508902005, -6.2114399724), (0.582025689, -5.7183418644))
        make_face()
        with BuildLine():
            Line((-3.4418052317, 4.4109199439), (-4.4254581722, 5.0679442137))
            ThreePointArc((-4.4254581722, 5.0679442137), (-4.0627031818, 4.7260354038), (-3.832025689, 4.2841296315))
            Line((-3.832025689, 4.2841296315), (-3.4418052317, 4.4109199439))
        make_face()
        with BuildLine():
            Line((3.1314578476, -4.6364005169), (2.8902883419, -4.9683418644))
            ThreePointArc((2.8902883419, -4.9683418644), (3.2392824408, -5.3242855906), (3.4523595855, -5.7749417209))
            Line((3.4523595855, -5.7749417209), (3.1314578476, -4.6364005169))
        make_face()
        with BuildLine():
            Line((-3.0515847744, 4.5377102563), (-3.4418052317, 4.4109199439))
            Line((-3.4418052317, 4.4109199439), (-2.4581522912, 3.7538956741))
            ThreePointArc((-2.4581522912, 3.7538956741), (-2.8209072816, 4.095804484), (-3.0515847744, 4.5377102563))
        make_face()
        with BuildLine():
            Line((2.8105561096, -3.497859313), (3.1314578476, -4.6364005169))
            Line((3.1314578476, -4.6364005169), (3.3726273533, -4.3044591695))
            ThreePointArc((3.3726273533, -4.3044591695), (3.0236332544, -3.9485154433), (2.8105561096, -3.497859313))
        make_face()
        with BuildLine():
            Line((0.1918052317, 5.5915515519), (-0.1984152256, 5.4647612395))
            ThreePointArc((-0.1984152256, 5.4647612395), (-0.1434674891, 5.2358874455), (-0.125, 5.0012357479))
            ThreePointArc((-0.125, 5.0012357479), (-0.1483816177, 4.737421129), (-0.2177975376, 4.4818310601))
            Line((-0.2177975376, 4.4818310601), (0.1918052317, 5.5915515519))
        make_face()
        with BuildLine():
            ThreePointArc((4.1951714942, -1.5920997308), (4.6896154024, -1.6554877349), (5.1359831102, -1.8774081864))
            Line((5.1359831102, -1.8774081864), (5.3771526159, -1.545466839))
            Line((5.3771526159, -1.545466839), (4.1951714942, -1.5920997308))
        make_face()
        with BuildLine():
            Line((0.601408001, 6.7012720437), (0.1918052317, 5.5915515519))
            Line((0.1918052317, 5.5915515519), (0.582025689, 5.7183418644))
            ThreePointArc((0.582025689, 5.7183418644), (0.508902005, 6.2114399724), (0.601408001, 6.7012720437))
        make_face()
        with BuildLine():
            Line((5.6183221216, -1.2135254916), (5.3771526159, -1.545466839))
            Line((5.3771526159, -1.545466839), (6.5591337375, -1.4988339471))
            ThreePointArc((6.5591337375, -1.4988339471), (6.0646898294, -1.435445943), (5.6183221216, -1.2135254916))
        make_face()
        with BuildLine():
            ThreePointArc((3.4523595855, 5.7749417209), (3.2392824408, 5.3242855906), (2.8902883419, 4.9683418644))
            Line((2.8902883419, 4.9683418644), (3.1314578476, 4.6364005169))
            Line((3.1314578476, 4.6364005169), (3.4523595855, 5.7749417209))
        make_face()
        with BuildLine():
            Line((5.3771526159, 1.545466839), (5.6183221216, 1.2135254916))
            ThreePointArc((5.6183221216, 1.2135254916), (6.0646898294, 1.435445943), (6.5591337375, 1.4988339471))
            Line((6.5591337375, 1.4988339471), (5.3771526159, 1.545466839))
        make_face()
        with BuildLine():
            Line((3.3726273533, 4.3044591695), (3.1314578476, 4.6364005169))
            Line((3.1314578476, 4.6364005169), (2.8105561096, 3.497859313))
            ThreePointArc((2.8105561096, 3.497859313), (3.0236332544, 3.9485154433), (3.3726273533, 4.3044591695))
        make_face()
        with BuildLine():
            Line((4.1951714942, 1.5920997308), (5.3771526159, 1.545466839))
            Line((5.3771526159, 1.545466839), (5.1359831102, 1.8774081864))
            ThreePointArc((5.1359831102, 1.8774081864), (4.6896154024, 1.6554877349), (4.1951714942, 1.5920997308))
        make_face()
    extrude(amount=F1_DEPTH)


solid = f1.part
